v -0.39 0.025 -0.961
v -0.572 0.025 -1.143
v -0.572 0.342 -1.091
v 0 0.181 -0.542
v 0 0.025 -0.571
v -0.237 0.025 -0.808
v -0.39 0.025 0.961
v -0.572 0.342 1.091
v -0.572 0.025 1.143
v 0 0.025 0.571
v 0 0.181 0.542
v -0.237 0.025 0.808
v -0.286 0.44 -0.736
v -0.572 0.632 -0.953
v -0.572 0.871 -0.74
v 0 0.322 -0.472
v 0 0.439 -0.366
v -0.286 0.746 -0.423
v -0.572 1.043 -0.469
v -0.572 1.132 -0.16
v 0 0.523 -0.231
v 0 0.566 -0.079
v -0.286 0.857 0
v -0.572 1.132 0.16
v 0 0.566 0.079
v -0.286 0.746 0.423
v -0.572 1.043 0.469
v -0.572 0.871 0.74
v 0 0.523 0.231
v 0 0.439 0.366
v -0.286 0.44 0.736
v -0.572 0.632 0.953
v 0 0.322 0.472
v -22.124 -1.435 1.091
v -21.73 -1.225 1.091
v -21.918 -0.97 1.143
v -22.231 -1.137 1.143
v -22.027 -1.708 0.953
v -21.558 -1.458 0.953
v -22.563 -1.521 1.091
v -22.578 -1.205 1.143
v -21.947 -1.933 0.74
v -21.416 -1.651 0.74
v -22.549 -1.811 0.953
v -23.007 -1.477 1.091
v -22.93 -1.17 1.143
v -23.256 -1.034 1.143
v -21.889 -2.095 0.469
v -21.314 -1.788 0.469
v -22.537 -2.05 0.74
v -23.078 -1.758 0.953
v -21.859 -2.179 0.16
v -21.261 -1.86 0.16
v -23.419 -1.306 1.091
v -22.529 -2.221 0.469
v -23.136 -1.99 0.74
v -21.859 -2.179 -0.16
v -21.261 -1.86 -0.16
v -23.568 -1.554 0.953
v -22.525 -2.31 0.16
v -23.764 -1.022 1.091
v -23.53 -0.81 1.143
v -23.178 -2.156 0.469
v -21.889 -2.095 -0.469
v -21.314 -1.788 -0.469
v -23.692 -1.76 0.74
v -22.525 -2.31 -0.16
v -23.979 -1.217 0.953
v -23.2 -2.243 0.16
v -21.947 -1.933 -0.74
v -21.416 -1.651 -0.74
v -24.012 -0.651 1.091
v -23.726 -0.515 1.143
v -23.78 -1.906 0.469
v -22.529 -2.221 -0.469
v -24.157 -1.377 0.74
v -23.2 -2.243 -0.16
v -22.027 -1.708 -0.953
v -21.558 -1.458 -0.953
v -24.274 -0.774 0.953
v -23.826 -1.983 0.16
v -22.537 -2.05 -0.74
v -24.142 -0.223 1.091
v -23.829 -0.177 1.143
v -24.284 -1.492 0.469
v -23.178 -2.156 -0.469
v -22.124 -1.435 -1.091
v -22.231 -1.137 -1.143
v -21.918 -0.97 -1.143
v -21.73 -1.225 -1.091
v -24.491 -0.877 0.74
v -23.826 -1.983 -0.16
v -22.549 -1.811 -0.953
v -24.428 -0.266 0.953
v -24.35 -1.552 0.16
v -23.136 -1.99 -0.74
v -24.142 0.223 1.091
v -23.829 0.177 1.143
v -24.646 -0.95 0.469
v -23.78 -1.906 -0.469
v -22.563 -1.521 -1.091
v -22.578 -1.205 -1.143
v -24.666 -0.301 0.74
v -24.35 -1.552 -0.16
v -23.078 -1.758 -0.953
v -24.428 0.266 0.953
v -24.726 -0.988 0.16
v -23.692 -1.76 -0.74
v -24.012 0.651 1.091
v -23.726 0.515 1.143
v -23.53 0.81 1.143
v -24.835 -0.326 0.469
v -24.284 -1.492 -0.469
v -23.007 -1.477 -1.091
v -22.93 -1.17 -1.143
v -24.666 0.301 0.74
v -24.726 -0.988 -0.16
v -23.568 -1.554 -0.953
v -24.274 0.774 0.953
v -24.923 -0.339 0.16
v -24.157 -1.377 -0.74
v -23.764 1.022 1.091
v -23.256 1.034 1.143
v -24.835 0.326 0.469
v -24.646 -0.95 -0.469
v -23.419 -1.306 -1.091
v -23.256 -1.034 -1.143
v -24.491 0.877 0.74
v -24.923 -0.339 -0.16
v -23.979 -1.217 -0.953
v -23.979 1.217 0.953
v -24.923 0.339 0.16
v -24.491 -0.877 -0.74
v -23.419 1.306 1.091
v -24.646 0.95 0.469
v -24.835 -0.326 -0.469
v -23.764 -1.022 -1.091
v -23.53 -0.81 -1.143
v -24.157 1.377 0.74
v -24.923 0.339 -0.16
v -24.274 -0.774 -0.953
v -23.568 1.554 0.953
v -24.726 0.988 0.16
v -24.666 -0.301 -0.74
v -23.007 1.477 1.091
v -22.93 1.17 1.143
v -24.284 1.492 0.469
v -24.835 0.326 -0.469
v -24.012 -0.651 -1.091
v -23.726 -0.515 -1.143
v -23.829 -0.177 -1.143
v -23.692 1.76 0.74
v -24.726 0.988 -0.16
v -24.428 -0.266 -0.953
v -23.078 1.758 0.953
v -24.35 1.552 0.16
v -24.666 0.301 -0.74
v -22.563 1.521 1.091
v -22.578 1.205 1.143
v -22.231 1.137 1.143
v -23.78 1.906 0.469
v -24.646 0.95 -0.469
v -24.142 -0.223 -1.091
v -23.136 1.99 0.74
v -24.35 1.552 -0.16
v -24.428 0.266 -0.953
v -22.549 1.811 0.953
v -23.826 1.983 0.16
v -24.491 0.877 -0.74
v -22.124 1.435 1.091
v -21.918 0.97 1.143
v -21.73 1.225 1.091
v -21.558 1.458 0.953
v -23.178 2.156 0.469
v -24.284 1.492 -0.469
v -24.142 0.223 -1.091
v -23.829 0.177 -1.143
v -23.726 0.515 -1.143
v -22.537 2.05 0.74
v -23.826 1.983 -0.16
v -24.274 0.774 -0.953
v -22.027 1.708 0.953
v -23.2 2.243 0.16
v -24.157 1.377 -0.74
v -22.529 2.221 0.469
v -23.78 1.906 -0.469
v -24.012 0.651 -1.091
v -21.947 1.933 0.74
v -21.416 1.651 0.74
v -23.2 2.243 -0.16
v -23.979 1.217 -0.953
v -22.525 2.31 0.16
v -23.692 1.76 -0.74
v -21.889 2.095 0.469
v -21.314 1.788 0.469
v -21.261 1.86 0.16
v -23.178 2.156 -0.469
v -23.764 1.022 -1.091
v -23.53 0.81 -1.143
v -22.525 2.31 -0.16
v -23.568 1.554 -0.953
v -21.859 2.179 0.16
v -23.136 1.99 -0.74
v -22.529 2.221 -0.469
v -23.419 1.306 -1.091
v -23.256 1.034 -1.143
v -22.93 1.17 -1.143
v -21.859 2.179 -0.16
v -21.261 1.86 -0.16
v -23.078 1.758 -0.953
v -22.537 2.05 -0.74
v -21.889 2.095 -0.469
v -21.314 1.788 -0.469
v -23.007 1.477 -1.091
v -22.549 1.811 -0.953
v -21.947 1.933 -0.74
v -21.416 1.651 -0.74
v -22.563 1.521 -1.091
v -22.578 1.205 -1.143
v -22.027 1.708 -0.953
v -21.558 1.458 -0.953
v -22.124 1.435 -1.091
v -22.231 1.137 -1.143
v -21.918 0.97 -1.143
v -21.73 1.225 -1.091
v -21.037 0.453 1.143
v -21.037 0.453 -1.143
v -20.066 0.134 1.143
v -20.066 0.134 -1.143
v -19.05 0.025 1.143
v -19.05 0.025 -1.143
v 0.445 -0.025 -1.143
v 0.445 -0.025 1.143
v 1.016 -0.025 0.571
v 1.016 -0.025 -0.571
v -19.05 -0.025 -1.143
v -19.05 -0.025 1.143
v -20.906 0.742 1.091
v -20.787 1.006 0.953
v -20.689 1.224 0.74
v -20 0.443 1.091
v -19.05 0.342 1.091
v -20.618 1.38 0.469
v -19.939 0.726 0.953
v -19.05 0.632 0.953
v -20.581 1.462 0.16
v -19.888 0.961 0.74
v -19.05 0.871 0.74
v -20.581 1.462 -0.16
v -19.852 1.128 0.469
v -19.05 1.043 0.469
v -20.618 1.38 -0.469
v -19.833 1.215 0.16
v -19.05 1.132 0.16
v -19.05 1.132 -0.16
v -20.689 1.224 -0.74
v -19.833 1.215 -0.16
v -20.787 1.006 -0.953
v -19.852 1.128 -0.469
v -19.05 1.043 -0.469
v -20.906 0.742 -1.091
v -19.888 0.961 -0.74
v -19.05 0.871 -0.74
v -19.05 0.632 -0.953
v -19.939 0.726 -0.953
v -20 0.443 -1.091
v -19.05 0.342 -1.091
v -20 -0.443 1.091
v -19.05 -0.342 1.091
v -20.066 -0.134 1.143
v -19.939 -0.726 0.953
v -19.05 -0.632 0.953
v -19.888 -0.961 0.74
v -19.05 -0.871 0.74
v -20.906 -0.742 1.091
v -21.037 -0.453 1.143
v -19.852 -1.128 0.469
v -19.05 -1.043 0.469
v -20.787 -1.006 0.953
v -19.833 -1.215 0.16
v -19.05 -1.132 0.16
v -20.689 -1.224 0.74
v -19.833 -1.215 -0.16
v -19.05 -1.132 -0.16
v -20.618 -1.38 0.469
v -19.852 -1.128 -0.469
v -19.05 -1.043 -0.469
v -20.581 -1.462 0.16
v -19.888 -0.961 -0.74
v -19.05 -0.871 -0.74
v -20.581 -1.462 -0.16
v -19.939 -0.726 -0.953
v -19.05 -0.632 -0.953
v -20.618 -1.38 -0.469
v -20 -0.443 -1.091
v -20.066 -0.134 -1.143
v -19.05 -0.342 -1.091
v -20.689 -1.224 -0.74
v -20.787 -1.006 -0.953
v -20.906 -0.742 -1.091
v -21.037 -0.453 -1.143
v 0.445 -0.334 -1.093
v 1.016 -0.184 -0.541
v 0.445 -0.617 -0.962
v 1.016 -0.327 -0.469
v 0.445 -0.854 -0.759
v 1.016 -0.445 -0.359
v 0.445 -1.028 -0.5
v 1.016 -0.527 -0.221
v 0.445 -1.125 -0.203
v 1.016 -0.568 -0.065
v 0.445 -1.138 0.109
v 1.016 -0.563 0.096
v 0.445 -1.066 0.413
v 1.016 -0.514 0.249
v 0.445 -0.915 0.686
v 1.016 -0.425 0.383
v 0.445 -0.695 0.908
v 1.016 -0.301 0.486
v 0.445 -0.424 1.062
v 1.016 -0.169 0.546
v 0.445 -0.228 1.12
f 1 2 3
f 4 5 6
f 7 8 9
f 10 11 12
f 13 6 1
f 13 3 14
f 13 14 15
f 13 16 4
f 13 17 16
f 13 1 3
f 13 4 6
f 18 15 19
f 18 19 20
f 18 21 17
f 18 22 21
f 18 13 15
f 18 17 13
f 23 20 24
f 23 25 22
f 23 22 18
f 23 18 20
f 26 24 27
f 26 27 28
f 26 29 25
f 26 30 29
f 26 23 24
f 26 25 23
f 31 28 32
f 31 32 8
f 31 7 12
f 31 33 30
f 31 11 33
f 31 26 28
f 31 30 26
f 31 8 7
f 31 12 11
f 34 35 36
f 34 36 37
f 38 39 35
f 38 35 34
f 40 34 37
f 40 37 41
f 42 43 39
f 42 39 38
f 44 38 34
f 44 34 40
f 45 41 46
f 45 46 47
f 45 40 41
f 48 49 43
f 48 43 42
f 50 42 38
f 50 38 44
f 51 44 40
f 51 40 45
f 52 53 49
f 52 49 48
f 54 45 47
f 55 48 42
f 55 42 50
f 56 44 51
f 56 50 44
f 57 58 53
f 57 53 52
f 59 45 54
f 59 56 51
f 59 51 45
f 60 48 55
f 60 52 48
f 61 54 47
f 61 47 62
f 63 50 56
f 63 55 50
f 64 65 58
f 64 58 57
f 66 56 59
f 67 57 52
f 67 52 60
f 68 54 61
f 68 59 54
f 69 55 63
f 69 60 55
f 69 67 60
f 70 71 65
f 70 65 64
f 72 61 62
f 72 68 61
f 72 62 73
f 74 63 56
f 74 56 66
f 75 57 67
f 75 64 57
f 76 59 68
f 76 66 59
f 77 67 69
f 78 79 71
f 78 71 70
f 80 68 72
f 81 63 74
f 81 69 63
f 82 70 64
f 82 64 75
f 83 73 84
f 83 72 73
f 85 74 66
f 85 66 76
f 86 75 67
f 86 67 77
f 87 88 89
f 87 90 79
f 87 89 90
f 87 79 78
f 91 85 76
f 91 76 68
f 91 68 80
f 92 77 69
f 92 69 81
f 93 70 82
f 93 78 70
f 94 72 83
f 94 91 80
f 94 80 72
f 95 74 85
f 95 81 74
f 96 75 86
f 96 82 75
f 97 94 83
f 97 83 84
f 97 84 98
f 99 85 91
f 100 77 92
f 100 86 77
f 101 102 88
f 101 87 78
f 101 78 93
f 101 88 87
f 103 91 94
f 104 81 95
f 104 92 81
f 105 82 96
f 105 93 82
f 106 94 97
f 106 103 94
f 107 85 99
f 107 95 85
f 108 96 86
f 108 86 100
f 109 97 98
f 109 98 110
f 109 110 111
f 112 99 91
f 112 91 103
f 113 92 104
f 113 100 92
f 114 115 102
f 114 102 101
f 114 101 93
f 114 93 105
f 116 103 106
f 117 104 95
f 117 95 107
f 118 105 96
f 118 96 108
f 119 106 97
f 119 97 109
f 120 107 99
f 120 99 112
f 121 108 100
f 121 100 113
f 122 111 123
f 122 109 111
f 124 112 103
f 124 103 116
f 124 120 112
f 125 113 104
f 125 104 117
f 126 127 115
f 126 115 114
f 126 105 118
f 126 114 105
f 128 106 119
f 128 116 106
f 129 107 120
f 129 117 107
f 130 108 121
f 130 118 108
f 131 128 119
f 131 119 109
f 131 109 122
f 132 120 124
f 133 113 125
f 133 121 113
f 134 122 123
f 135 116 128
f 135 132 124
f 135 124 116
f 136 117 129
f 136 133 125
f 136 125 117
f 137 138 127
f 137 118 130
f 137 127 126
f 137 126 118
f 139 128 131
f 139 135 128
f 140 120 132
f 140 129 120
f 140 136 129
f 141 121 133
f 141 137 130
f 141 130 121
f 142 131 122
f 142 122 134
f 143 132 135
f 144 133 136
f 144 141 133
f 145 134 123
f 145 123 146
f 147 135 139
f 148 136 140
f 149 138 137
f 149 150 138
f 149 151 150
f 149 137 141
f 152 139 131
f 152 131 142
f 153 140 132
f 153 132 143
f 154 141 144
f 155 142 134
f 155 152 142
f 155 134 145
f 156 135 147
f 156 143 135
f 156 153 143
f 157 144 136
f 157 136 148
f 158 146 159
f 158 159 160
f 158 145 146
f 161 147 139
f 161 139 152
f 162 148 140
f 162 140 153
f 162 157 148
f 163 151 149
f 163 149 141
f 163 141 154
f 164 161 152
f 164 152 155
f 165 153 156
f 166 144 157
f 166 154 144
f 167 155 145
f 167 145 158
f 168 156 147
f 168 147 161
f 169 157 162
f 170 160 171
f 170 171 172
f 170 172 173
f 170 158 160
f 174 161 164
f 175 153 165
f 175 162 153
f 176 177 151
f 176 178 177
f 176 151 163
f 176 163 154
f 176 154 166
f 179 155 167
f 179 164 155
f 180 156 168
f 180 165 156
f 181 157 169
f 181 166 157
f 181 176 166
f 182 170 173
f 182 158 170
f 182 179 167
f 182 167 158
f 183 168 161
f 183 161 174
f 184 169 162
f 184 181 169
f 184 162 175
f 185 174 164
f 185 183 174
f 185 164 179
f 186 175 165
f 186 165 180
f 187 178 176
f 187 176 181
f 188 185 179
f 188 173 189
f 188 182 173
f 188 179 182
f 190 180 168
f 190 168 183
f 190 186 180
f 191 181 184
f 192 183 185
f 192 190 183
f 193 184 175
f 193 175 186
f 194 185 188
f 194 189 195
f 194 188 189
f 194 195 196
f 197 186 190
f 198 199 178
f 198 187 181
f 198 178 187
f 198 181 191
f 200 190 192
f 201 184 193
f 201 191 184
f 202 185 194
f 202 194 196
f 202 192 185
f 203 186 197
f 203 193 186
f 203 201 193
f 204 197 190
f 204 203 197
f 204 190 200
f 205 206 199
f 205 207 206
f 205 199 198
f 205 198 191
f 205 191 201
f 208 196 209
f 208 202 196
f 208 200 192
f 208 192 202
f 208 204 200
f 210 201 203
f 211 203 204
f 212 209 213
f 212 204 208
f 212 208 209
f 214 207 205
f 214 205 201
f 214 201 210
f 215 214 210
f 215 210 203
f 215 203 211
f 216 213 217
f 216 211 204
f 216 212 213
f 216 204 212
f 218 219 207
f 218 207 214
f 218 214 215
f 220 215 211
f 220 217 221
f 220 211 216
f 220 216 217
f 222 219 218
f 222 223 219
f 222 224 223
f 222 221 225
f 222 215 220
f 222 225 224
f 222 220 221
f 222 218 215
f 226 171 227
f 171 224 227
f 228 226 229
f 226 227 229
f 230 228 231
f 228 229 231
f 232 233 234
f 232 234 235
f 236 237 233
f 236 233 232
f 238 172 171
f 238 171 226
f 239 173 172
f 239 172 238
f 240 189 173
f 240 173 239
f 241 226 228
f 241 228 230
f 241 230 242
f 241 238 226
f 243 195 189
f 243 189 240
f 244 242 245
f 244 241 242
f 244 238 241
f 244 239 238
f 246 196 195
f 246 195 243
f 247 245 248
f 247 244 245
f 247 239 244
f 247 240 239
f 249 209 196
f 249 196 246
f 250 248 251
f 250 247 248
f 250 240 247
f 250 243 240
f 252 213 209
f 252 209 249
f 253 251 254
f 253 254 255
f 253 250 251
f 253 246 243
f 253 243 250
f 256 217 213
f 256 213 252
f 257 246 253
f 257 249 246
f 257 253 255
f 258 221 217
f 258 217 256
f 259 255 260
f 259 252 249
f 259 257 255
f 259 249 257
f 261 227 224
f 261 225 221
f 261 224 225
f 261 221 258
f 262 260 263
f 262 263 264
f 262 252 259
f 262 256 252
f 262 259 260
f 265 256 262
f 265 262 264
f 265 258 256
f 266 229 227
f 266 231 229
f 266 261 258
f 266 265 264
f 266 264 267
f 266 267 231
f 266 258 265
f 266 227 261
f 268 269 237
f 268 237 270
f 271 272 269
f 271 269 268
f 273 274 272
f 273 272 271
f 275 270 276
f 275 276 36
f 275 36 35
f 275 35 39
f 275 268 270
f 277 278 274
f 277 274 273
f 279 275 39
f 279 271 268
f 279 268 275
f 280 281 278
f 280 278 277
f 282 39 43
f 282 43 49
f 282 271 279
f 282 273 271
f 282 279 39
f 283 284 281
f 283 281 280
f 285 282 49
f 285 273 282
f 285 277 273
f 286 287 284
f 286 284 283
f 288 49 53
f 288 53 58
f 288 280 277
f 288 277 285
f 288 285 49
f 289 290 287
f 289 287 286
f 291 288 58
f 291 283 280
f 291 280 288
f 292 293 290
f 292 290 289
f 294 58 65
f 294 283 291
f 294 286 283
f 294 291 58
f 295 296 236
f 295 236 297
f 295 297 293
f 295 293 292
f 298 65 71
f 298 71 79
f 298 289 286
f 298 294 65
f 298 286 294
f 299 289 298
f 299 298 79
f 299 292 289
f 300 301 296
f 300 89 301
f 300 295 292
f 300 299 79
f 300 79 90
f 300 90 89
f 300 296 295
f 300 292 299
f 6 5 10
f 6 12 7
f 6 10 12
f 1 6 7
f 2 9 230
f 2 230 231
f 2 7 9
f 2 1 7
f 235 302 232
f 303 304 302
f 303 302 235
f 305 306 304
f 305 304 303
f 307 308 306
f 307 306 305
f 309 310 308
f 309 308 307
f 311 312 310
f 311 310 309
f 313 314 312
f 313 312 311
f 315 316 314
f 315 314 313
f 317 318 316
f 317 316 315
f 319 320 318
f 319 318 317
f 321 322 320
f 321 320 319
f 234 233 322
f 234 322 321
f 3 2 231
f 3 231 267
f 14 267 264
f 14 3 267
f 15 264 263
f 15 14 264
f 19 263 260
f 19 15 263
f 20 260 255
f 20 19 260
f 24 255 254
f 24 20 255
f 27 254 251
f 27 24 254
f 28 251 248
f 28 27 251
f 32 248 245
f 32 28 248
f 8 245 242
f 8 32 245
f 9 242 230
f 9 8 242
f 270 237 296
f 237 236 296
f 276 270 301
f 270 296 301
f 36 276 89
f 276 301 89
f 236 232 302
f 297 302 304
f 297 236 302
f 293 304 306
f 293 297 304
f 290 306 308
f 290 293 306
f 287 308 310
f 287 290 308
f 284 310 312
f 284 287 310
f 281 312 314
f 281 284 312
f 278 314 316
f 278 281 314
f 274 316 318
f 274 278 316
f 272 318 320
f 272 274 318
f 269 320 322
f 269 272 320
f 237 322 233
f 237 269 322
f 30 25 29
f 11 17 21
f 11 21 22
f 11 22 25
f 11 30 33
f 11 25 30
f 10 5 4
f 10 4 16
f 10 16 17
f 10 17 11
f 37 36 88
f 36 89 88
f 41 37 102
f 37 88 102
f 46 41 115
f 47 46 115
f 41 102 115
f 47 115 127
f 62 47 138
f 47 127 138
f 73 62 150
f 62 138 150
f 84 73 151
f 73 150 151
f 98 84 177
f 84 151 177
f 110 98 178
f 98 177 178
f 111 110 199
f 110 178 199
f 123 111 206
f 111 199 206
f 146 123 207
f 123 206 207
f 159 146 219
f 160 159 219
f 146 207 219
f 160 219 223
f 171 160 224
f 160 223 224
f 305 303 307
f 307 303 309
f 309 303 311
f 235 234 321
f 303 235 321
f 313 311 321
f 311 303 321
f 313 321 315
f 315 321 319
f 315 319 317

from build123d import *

# Parameters (mm, degrees)
CHAMFER1_SIZE = 0.5715


with BuildPart() as part:
    # Sweep2: sweep along a path in Sketch3
    with BuildLine(Plane.XY) as sweep2_path:
        Line((1.016, -0.0254), (-19.05, -0.0254))
        ThreePointArc((-19.05, -0.0254), (-20.559965377, -0.267702741), (-21.918306738, -0.97028))
        ThreePointArc((-21.918306738, -0.97028), (-23.841883423, 0), (-21.918306738, 0.97028))
        ThreePointArc((-21.918306738, 0.97028), (-20.559965377, 0.267702741), (-19.05, 0.0254))
        Line((-19.05, 0.0254), (0, 0.0254))
    # Sketch4 → Sweep2 (sweep)
    with BuildSketch(Plane(origin=(0, 0, 0), x_dir=(0, 0, -1), z_dir=(1, 0, 0))):
        with BuildLine():
            Line((-1.143, 0.0254), (1.143, 0.0254))
            ThreePointArc((1.143, 0.0254), (0, 1.143), (-1.143, 0.0254))
        make_face()
    sweep(path=sweep2_path.line)

    # Chamfer1
    chamfer1_edges = [part.edges().sort_by_distance(p)[0] for p in [
        (0, 1.143, 0),
        (1.016, -1.143, 0),
    ]]
    chamfer(chamfer1_edges, length=CHAMFER1_SIZE)


solid = part.part
